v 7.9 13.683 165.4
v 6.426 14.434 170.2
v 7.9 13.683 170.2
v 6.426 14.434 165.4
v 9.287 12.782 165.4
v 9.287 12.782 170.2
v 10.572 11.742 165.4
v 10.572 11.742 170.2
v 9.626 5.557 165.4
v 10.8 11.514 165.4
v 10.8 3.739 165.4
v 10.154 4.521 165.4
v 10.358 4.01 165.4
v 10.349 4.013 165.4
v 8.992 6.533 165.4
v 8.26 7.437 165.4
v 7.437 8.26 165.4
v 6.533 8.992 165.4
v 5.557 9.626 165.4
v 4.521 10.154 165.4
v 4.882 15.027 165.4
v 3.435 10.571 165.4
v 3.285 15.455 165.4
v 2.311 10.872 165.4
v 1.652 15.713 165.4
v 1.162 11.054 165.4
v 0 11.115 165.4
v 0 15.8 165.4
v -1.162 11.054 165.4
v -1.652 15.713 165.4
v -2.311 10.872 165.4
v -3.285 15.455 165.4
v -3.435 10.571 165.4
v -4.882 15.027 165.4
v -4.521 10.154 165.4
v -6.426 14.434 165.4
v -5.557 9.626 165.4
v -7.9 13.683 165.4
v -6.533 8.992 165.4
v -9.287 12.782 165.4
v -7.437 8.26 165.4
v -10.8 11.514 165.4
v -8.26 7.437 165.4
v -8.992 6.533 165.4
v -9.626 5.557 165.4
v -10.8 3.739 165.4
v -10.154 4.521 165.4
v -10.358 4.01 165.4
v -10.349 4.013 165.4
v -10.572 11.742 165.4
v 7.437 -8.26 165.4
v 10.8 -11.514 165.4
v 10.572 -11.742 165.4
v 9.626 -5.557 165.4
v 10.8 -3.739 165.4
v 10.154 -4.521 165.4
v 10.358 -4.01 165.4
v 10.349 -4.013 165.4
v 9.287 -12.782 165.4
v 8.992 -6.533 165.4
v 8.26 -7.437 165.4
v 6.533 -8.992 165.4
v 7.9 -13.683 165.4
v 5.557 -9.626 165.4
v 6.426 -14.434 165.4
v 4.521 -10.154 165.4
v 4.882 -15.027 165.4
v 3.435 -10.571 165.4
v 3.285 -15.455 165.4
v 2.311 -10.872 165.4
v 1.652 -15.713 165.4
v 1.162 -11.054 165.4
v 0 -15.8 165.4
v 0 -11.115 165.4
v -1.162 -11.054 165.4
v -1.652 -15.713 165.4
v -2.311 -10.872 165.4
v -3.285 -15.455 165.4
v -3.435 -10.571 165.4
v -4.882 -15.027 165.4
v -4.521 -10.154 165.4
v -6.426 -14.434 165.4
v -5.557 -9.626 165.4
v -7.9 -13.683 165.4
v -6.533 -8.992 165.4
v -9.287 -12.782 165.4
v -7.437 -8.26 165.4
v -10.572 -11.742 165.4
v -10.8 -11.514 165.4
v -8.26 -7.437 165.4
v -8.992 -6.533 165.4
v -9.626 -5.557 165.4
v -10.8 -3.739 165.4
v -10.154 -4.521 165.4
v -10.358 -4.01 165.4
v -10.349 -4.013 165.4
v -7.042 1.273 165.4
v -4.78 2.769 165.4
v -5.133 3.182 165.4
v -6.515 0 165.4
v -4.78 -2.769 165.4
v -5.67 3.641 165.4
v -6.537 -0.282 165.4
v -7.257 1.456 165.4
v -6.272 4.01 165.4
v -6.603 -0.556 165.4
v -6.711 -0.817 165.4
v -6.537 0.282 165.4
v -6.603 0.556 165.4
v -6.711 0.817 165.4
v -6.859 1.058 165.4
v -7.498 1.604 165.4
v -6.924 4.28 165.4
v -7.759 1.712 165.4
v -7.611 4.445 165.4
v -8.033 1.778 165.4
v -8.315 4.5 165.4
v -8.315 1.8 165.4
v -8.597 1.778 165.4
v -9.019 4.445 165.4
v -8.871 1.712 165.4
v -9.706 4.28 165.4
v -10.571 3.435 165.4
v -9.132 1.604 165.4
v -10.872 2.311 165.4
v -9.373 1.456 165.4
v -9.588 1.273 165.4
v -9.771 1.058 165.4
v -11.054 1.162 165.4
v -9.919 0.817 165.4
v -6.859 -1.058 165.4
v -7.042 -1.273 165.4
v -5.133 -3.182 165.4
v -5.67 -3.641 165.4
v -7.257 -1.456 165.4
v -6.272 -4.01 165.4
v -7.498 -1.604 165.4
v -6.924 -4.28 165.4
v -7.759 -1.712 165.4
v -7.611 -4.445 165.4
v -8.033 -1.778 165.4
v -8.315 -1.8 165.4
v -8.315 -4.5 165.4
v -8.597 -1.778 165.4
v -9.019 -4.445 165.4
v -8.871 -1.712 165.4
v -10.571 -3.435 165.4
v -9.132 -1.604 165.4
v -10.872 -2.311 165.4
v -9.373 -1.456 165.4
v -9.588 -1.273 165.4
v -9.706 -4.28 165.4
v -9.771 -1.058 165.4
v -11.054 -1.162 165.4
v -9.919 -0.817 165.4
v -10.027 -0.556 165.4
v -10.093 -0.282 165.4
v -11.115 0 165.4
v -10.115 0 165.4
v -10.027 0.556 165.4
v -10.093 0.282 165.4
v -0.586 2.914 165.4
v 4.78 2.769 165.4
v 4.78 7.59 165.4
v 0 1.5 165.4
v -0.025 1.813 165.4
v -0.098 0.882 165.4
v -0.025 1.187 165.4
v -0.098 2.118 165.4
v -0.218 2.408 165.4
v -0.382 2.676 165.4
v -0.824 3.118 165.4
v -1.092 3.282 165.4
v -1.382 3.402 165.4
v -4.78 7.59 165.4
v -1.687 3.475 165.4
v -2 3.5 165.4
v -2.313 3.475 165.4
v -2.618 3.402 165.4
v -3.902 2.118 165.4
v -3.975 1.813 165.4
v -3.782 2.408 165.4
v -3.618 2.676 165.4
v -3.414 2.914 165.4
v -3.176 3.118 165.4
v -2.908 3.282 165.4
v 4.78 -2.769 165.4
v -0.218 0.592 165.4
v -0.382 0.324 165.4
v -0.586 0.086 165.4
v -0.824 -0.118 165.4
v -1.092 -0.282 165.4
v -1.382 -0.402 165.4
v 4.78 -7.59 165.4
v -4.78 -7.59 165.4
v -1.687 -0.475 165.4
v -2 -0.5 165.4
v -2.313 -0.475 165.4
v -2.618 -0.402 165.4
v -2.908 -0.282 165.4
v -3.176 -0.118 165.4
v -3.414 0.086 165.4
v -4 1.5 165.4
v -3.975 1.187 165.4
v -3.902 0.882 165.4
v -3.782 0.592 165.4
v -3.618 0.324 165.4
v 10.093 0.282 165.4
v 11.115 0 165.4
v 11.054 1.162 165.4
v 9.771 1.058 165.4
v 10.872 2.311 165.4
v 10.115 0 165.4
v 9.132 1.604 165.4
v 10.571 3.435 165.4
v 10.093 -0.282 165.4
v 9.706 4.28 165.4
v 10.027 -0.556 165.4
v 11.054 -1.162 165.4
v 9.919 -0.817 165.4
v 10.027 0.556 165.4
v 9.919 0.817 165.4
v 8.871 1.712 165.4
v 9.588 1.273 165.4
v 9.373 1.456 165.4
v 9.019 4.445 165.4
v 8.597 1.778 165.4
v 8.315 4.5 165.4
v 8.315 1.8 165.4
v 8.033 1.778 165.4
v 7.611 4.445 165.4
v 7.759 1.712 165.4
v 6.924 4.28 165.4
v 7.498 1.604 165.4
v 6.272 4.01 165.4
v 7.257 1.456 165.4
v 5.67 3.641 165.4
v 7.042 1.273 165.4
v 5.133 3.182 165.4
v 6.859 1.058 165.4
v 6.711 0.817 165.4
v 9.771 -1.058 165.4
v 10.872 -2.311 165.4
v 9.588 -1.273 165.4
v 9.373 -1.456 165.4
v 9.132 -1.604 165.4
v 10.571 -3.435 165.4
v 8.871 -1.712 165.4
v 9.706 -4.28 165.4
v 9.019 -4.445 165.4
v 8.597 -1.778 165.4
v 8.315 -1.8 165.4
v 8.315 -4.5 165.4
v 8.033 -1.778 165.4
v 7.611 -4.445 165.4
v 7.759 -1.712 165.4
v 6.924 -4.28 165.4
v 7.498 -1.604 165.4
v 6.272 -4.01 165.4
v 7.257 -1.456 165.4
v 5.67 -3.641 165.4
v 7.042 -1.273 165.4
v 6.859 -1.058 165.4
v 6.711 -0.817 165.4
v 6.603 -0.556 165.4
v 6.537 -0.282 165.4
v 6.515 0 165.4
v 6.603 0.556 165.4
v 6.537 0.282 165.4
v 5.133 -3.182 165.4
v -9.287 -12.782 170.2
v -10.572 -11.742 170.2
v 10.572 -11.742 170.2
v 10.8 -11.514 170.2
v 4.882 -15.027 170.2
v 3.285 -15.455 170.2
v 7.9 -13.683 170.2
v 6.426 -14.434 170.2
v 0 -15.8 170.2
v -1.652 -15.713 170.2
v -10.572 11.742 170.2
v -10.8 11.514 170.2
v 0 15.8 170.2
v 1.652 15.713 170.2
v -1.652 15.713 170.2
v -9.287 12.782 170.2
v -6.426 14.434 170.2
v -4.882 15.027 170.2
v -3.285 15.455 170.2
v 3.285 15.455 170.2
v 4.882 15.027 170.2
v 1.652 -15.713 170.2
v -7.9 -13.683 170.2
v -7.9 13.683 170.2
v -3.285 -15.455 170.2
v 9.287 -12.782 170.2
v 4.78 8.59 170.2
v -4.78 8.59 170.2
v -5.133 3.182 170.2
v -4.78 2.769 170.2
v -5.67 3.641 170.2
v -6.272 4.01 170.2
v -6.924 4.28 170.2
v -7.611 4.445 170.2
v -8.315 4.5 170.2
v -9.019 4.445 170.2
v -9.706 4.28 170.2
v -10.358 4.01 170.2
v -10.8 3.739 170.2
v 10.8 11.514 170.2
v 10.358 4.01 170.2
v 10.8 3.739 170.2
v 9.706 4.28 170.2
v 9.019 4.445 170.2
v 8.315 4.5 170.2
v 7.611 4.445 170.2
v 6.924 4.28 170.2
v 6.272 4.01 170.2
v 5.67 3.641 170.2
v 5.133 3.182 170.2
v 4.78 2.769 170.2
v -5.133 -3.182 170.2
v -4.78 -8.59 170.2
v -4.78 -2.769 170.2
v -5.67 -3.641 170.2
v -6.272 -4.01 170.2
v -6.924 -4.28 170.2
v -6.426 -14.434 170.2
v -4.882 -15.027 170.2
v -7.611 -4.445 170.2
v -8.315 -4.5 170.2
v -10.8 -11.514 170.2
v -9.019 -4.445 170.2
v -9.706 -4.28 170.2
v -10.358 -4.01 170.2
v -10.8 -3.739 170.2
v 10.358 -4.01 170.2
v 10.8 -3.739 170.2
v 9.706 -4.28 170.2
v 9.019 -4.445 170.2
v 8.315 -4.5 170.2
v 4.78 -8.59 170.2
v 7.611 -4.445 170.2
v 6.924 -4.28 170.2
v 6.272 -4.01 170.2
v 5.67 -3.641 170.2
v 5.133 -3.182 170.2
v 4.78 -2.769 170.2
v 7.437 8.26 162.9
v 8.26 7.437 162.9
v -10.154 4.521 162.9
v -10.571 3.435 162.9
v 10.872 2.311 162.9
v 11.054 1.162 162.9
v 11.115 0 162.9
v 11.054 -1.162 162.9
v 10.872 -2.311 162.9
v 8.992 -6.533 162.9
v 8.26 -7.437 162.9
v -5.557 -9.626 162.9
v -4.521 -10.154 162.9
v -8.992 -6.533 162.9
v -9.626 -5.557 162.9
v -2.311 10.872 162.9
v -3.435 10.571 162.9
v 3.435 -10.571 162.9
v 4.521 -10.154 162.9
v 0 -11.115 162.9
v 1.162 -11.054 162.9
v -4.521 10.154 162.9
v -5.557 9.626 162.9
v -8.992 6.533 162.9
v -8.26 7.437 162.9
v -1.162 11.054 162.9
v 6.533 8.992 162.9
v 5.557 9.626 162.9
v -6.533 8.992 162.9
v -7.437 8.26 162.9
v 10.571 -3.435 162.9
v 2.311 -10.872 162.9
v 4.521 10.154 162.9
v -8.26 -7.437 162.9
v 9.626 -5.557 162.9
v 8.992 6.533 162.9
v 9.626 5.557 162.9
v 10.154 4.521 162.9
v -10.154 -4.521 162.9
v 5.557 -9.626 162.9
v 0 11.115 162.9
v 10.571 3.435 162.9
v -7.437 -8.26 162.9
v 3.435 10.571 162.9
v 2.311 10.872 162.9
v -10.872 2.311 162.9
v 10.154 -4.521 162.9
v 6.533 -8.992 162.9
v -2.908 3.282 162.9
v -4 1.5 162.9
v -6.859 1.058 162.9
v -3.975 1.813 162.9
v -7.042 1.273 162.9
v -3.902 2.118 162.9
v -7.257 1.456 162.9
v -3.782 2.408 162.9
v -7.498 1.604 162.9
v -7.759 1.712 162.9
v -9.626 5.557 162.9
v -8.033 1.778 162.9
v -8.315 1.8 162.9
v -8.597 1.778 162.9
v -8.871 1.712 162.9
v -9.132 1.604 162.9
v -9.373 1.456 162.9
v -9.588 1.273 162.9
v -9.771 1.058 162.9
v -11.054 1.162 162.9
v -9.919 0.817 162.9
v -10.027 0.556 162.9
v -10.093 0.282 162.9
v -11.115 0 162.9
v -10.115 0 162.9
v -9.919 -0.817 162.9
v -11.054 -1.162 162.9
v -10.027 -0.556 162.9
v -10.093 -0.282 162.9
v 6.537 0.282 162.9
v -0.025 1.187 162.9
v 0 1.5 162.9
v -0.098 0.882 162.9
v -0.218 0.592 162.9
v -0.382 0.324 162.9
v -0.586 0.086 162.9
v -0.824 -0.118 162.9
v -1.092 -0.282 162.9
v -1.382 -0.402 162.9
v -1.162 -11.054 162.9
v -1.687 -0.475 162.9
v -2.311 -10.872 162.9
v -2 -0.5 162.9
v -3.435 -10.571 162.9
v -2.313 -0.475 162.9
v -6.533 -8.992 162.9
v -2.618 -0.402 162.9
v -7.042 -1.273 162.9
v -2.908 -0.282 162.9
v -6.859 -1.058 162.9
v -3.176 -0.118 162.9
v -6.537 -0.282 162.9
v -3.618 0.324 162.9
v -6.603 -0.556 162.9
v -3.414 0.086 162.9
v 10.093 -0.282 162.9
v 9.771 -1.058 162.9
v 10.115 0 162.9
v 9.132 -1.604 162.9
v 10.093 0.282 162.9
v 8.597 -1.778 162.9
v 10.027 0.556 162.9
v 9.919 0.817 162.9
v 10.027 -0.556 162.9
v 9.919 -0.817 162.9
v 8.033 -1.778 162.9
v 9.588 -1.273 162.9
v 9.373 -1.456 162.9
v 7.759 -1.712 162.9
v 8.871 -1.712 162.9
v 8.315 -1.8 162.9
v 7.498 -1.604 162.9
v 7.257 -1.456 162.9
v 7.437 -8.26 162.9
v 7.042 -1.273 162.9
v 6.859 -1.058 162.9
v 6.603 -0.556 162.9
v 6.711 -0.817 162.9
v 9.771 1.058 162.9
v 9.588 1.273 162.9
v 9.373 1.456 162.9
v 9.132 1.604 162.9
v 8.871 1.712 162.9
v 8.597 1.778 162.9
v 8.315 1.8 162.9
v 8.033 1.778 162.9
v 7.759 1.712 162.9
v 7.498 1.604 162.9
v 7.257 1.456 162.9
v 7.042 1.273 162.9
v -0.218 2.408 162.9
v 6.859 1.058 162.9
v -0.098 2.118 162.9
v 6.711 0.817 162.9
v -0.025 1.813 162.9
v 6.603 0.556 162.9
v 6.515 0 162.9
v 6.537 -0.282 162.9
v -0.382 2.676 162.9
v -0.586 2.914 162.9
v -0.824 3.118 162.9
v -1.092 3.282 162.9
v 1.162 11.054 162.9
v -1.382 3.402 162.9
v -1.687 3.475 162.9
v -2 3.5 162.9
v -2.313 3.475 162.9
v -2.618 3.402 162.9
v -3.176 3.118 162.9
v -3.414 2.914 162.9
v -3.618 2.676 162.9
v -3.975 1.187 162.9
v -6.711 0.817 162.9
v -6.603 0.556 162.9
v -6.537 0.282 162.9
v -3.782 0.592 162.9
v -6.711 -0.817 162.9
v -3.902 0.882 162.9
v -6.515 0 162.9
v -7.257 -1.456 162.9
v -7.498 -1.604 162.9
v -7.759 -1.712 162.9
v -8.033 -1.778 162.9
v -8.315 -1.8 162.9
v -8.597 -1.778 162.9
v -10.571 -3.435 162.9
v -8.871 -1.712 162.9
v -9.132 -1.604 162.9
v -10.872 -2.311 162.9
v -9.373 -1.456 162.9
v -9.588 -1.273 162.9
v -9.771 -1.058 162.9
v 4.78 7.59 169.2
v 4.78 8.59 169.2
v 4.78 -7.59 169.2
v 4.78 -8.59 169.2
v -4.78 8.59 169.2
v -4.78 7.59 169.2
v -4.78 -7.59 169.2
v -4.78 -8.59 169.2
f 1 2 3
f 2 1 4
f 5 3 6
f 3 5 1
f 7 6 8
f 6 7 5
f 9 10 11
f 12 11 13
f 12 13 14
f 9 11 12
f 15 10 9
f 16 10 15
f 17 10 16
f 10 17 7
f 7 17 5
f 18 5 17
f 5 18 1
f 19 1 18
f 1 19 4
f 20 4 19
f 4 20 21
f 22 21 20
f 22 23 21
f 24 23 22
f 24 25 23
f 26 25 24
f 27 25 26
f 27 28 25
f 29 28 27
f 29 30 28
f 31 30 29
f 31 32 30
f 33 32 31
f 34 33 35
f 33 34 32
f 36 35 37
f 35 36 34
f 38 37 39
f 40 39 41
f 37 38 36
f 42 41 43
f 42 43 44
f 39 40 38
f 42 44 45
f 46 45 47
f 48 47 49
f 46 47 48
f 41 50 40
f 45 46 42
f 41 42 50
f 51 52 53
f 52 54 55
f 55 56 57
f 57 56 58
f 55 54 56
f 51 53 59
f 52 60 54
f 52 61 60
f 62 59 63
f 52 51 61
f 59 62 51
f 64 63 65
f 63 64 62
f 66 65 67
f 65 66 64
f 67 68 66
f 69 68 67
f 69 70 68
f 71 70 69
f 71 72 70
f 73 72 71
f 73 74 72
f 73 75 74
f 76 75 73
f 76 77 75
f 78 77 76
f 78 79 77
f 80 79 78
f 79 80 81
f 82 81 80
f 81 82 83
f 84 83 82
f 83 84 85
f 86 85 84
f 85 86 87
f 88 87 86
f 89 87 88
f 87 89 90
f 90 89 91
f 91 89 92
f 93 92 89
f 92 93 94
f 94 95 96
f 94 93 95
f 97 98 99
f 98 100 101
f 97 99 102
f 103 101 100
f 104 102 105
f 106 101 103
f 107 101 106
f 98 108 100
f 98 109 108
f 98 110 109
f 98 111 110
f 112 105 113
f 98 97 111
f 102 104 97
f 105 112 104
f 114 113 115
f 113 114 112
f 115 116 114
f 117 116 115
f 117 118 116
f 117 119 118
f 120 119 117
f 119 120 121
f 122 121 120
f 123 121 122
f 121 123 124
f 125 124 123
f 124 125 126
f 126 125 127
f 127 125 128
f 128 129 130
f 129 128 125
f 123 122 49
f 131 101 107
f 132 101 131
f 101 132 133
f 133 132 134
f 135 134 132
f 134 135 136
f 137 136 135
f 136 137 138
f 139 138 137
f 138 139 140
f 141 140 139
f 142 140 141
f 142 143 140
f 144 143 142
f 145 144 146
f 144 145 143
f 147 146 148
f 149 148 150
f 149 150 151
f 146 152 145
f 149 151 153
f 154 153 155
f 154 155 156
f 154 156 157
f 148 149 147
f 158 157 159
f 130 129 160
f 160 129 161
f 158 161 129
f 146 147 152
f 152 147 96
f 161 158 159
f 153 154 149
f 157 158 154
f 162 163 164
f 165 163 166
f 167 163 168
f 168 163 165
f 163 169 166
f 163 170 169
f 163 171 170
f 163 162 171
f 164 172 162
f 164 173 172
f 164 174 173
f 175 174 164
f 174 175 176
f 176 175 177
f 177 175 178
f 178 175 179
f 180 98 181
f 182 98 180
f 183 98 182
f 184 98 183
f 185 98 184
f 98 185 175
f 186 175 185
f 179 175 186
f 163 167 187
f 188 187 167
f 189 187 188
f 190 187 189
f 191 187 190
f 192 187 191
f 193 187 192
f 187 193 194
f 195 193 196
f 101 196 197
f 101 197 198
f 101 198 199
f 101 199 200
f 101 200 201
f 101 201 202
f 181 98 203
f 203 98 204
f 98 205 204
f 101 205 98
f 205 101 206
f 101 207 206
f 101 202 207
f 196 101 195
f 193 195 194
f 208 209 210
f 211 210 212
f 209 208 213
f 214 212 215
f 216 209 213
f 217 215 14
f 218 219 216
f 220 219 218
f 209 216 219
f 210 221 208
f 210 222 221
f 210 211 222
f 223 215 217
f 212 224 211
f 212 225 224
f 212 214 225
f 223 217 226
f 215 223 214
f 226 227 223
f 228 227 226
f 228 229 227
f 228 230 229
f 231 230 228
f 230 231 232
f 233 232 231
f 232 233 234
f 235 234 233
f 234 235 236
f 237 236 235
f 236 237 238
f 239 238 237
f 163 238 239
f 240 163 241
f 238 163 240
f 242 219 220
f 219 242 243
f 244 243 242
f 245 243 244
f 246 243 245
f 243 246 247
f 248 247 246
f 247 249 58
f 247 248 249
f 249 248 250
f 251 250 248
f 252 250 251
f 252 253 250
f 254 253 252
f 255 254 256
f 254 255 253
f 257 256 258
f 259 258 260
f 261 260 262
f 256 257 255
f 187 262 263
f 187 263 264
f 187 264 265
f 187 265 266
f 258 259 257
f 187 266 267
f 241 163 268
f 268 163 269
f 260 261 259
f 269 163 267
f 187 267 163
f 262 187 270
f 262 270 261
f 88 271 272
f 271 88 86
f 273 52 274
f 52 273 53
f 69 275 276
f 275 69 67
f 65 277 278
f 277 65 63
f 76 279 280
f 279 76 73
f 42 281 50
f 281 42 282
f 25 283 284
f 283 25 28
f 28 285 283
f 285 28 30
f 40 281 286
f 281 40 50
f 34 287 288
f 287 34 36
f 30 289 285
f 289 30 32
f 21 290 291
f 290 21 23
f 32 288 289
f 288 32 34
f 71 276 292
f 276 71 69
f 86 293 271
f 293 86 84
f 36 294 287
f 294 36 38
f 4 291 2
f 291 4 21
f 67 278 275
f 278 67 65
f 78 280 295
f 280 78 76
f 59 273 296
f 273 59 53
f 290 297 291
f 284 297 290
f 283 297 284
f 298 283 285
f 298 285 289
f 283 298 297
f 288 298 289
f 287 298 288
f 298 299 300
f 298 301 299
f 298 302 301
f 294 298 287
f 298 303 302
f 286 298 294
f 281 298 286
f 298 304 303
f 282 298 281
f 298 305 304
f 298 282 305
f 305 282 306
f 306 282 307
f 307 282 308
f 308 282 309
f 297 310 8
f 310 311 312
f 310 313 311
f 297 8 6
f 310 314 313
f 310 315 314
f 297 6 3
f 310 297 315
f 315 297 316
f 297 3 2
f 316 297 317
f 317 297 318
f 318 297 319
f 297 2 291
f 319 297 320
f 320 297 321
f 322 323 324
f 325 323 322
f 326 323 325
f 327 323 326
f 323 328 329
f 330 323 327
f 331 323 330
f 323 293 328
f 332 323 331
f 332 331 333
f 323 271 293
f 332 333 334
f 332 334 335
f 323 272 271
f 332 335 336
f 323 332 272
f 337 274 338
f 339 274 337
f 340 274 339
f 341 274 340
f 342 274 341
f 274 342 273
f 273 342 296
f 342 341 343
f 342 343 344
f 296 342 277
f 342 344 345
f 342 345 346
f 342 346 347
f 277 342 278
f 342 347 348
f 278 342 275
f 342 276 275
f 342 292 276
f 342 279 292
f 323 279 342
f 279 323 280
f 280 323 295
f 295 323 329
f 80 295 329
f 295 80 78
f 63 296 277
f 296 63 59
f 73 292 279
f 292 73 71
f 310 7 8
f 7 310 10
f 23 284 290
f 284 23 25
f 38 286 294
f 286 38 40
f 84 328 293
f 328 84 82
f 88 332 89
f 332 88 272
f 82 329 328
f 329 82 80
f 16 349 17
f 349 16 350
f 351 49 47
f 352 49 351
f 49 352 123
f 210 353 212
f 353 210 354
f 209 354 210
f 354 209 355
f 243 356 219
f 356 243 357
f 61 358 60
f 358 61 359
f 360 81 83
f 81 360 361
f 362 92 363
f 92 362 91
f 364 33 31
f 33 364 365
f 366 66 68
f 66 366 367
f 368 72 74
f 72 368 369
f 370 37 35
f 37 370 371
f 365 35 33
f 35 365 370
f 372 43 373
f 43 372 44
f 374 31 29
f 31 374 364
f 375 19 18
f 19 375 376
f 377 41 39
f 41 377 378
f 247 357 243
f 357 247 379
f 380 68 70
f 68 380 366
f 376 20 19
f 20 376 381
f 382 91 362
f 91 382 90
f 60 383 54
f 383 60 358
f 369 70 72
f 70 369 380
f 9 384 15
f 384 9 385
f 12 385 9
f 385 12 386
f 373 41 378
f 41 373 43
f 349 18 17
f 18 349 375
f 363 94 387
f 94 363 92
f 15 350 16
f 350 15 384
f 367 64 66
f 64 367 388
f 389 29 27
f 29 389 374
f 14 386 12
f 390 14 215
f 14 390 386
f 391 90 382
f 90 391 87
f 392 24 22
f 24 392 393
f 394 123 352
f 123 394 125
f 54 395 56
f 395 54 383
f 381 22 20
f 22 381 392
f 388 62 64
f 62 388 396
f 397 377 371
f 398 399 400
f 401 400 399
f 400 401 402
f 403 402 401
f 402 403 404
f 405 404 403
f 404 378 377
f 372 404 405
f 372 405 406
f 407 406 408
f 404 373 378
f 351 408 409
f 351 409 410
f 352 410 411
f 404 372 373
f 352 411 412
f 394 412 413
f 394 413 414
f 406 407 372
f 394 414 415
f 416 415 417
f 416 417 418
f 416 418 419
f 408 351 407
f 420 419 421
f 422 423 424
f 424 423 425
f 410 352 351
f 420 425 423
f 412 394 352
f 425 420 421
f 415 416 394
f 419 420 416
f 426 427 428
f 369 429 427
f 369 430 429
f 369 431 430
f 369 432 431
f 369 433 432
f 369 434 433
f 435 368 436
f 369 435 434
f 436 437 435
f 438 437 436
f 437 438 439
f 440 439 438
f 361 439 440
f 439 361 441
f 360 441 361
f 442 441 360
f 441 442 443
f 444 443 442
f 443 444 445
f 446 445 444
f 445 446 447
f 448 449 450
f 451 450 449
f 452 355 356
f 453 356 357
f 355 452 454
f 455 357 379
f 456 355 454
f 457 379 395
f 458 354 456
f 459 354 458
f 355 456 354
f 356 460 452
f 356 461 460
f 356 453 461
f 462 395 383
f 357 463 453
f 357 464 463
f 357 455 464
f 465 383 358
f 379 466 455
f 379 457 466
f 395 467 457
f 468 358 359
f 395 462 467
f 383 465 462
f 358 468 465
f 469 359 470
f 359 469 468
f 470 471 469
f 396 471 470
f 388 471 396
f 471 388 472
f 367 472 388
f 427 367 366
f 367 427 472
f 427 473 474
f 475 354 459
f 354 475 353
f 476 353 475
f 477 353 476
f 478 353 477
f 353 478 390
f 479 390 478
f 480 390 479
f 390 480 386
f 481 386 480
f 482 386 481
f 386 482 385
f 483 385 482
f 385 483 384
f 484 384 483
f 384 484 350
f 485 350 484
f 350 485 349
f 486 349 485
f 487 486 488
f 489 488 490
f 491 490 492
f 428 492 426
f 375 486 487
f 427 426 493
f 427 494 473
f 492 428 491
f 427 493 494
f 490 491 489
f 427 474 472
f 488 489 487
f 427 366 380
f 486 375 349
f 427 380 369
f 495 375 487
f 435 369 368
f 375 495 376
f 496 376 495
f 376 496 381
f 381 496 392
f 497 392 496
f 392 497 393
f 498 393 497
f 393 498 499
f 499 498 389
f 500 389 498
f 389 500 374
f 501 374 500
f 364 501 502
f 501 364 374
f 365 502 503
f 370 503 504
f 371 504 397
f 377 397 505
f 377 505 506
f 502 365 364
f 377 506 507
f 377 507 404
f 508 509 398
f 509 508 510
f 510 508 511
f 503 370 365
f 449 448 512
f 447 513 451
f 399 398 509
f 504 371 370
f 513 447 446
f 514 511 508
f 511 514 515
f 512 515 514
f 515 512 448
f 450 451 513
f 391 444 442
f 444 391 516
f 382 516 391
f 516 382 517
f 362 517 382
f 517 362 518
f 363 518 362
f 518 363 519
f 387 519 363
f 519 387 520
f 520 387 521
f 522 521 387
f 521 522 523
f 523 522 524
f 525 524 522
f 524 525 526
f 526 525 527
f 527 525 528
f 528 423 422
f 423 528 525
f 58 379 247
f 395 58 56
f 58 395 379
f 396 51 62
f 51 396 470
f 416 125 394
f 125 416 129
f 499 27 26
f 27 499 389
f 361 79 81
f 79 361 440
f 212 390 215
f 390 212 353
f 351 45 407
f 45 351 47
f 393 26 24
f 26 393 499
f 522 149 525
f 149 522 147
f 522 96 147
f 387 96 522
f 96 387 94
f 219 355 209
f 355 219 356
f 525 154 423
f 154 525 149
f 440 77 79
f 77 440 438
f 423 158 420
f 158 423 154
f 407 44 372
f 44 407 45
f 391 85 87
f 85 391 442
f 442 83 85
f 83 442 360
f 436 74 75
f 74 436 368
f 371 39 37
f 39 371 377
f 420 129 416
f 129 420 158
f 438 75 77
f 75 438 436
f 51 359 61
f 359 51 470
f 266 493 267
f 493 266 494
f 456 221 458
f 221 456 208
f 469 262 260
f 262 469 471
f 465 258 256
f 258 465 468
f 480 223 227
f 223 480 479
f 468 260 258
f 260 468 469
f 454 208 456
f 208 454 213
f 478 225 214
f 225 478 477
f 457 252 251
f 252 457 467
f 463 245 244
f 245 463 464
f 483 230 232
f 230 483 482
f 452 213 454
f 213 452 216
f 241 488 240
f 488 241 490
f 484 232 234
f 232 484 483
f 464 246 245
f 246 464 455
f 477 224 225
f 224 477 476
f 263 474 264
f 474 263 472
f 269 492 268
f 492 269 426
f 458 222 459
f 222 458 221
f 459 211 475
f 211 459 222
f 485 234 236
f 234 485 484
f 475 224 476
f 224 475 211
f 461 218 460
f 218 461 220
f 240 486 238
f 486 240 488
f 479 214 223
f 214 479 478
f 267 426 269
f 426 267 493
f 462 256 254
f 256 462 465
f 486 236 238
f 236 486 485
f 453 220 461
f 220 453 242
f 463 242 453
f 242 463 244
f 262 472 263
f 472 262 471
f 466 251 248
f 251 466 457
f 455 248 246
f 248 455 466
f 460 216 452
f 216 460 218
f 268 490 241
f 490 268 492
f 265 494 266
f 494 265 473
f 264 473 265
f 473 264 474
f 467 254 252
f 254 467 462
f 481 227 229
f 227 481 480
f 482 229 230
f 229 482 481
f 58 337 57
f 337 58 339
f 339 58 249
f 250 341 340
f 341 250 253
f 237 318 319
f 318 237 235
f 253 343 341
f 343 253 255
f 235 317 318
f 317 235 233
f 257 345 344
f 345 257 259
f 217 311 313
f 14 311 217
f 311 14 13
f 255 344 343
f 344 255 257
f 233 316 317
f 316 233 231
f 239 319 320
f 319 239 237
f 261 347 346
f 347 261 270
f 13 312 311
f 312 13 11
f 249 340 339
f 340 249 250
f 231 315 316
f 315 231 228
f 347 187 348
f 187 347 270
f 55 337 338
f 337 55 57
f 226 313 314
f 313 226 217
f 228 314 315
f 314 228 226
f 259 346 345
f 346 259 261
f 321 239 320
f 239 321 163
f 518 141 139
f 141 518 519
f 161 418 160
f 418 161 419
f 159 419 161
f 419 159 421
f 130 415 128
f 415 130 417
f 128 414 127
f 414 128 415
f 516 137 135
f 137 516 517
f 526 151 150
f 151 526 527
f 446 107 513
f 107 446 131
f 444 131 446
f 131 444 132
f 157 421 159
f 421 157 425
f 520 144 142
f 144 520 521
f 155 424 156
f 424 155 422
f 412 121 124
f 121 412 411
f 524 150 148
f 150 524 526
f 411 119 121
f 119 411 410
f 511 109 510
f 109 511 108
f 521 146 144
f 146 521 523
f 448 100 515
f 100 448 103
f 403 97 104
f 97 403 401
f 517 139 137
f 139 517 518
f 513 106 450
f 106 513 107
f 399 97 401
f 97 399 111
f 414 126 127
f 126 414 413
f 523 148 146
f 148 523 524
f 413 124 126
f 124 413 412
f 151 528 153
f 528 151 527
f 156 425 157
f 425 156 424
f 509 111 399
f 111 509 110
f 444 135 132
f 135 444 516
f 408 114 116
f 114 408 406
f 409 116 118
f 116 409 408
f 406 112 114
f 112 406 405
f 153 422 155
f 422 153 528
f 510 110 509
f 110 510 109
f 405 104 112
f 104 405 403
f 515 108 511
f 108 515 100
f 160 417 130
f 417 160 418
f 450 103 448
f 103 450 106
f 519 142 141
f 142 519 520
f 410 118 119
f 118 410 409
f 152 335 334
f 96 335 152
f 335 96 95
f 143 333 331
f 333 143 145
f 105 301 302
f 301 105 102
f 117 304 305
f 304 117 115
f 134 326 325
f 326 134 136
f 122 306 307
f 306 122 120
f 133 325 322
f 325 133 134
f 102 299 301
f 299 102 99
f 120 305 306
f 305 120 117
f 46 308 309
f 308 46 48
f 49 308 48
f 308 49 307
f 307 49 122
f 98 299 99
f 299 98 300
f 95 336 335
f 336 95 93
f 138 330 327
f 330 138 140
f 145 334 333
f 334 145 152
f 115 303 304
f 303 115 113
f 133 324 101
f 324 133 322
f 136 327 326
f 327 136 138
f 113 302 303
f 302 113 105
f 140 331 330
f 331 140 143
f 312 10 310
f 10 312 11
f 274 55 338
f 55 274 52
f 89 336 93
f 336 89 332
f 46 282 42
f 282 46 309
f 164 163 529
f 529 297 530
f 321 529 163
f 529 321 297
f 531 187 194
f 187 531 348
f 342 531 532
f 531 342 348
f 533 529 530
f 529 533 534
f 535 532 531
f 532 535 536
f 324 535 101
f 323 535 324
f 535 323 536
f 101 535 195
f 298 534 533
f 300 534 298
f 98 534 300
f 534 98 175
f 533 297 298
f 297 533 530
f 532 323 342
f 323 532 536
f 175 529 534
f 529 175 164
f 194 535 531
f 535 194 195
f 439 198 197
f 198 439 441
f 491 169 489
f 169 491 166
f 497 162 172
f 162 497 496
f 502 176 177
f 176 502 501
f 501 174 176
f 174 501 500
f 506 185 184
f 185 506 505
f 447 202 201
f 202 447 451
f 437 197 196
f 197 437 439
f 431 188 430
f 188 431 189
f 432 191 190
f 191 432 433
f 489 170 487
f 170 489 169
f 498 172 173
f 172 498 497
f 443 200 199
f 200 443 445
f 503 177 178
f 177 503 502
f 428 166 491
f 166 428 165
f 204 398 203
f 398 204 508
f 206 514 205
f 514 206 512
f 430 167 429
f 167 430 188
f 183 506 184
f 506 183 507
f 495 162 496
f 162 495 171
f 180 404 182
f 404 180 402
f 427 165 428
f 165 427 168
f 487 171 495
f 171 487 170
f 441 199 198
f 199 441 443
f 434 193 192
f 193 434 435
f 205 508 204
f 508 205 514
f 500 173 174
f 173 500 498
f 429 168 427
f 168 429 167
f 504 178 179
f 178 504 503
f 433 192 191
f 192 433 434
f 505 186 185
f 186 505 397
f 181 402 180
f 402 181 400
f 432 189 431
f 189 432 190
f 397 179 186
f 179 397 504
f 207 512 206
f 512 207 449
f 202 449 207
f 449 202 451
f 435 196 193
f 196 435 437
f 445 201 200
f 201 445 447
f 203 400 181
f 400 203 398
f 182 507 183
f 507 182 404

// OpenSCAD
// file: ../baffles.scad
use <shapes.scad>

D_OUTER = 2;
D_THIN  = 3;
D_INNER = 6;

module curveBridge(h, y, z, low, high)
{
    EPS = 0.1;

    // a + b*t + c*t*t + d*t*t*t
    al = low[0];
    bl = low[1];
    cl = low[2];
    dl = low[3];
    ah = high[0];
    bh = high[1];
    ch = high[2];
    dh = high[3];

    t = z;
    points = [
        [-EPS, al],
        [0.1, al + 0.1*bl + 0.1*0.1*cl + 0.1*0.1*0.1*dl],
        [0.2, al + 0.2*bl + 0.2*0.2*cl + 0.2*0.2*0.2*dl],
        [0.3, al + 0.3*bl + 0.3*0.3*cl + 0.3*0.3*0.3*dl],
        [0.4, al + 0.4*bl + 0.4*0.4*cl + 0.4*0.4*0.4*dl],
        [0.5, al + 0.5*bl + 0.5*0.5*cl + 0.5*0.5*0.5*dl],
        [0.6, al + 0.6*bl + 0.6*0.6*cl + 0.6*0.6*0.6*dl],
        [0.7, al + 0.7*bl + 0.7*0.7*cl + 0.7*0.7*0.7*dl],
        [0.8, al + 0.8*bl + 0.8*0.8*cl + 0.8*0.8*0.8*dl],
        [0.9, al + 0.9*bl + 0.9*0.9*cl + 0.9*0.9*0.9*dl],
        [1.0+EPS, al + 1.0*bl + 1.0*1.0*cl + 1.0*1.0*1.0*dl],
        [1.0+EPS, ah + 1.0*bh + 1.0*1.0*ch + 1.0*1.0*1.0*dh],
        [0.9, ah + 0.9*bh + 0.9*0.9*ch + 0.9*0.9*0.9*dh],
        [0.8, ah + 0.8*bh + 0.8*0.8*ch + 0.8*0.8*0.8*dh],
        [0.7, ah + 0.7*bh + 0.7*0.7*ch + 0.7*0.7*0.7*dh],
        [0.6, ah + 0.6*bh + 0.6*0.6*ch + 0.6*0.6*0.6*dh],
        [0.5, ah + 0.5*bh + 0.5*0.5*ch + 0.5*0.5*0.5*dh],
        [0.4, ah + 0.4*bh + 0.4*0.4*ch + 0.4*0.4*0.4*dh],
        [0.3, ah + 0.3*bh + 0.3*0.3*ch + 0.3*0.3*0.3*dh],
        [0.2, ah + 0.2*bh + 0.2*0.2*ch + 0.2*0.2*0.2*dh],
        [0.1, ah + 0.1*bh + 0.1*0.1*ch + 0.1*0.1*0.1*dh],
        [-EPS, ah]
    ];

    multmatrix(m = [ [0, 0, 1, 0],
                     [0, y, 0, 0],
                     [z, 0, 0, 0],
                     [0, 0, 0, 1]
                ])
    linear_extrude(height = h) {
        polygon(points=points);
    }  	
}

module bridge2(d, dz)
{
    difference() {
        intersection() 
        {
            tube(h=dz, do=d - D_OUTER, di=d - D_INNER);
            union() {
                translate([-d, d*0.10, 0]) {
                    polygonYZ(d*2, [
                        [0,0], [dz*2, dz*2], [dz*4, dz*1.5], [dz*2, 0]
                    ]);
                }        
                translate([-d, -d*0.32, 0]) {
                    polygonYZ(d*2, [[0,0], [dz*2, dz*2], [dz*2, 0]]);
                }        
            }
        }
        BATTERY = 19.0; // padded
        translate([0, d/2 - BATTERY/2, 0])
            cylinder(h=d, d=BATTERY);
    }
}

module bridge3(d, dz)
{
    difference() {
        union() {
            intersection() 
            {
                tube(h=dz, do=d - D_OUTER, di=d - D_INNER);
                union() {
                    translate([-d, 0, 0]) {
                        curveBridge(d*2, dz, dz, 
                            [-2.5, 1.0, 1.0, 0.0], 
                            [-1.5, 0.5, 2.0, 0.0]);
                    }
                    translate([-d, 0, 0]) {
                        curveBridge(d*2, dz, dz, 
                            [ 0.0, 1.0, 1.0, 0.0], 
                            [ 1.5, 0.0, 1.5, 0.0]);
                    }
                }
            }
            color("silver") 
            intersection() 
            {
                tube(h=dz, do=d - D_THIN, di=d - D_INNER);
                translate([-d, 0, 0]) {
                    curveBridge(d*2, dz, dz, 
                        [ 2.5, -1.0, -1.5, 0.0], 
                        [ 3.0, -1.0, 0.5, 0.0]);
                }
            }
            color("silver")
            intersection() 
            {
                tube(h=dz, do=d - D_THIN, di=d - D_INNER);
                translate([-d, 0, 0]) {
                    curveBridge(d*2, dz, dz, 
                        [ -0.8, -1.0, -0.5, -0.2], 
                        [ -0.2, -1.0, -0.1, 0.0]);
                }
            }
        }
        BATTERY = 19.0; // padded
        translate([0, d/2 - BATTERY/2, 0])
            cylinder(h=d, d=BATTERY);
        X = 19.0; // padded
        translate([-X/2, -d/2, 0])
            cube(size=[X, d/2, dz]);
    }
}

$fn = 80;

translate([0, 0, 0]) tube(h=4, do=32, di=26);
translate([0, 0, 8]) tube(h=4, do=32, di=26);
translate([0, 0, 16]) tube(h=4, do=32, di=26);
translate([0, 0, 24]) tube(h=4, do=32, di=26);
translate([0, 0, 32]) tube(h=4, do=32, di=26);

translate([0, 0, 4]) bridge3(32, 4);
translate([0, 0, 12]) bridge3(32, 4);
translate([0, 0, 20]) bridge3(32, 4);
translate([0, 0, 28]) bridge3(32, 4);


/*
translate([0, 0, 0]) cube(size=[1, 30, 4]);
translate([0, 0, 8]) cube(size=[1, 30, 4]);
translate([-1, 4, 4]) 
    curveBridge(0.8, 4, 4, [0, 1.0, 0.3, 0.1], 
                           [1, 1.0, 0.3, 0.1]);
translate([-1, 16, 4]) 
    curveBridge(0.8, 4, 4, [0, 1.0, 0.3, 0.1], 
                           [1, 1.0, 0.3, 0.1]);                           

translate([0, 16, 4]) 
    curveBridge(0.8, 4, 4, [0, -1.0, 0.3, 0.1], 
                           [0.6, -1.0, 0.3, 0.1]);
*/
// file: case.scad
use <../shapes.scad>
include <dim.scad>

module dotstar() {
    for(i=[0:3]) {
        translate([0, 0, 7.0*i]) rotate([0, -90, 0]) cylinder(h=100, d=2.0);
    }
}

module brassSleeve(addOuter=0)
{
    color("Gold") 
    difference() {
        union() {
            translate([0, 0, M_BRASS])
                tube(h=DZ_BRASS, do=DO_BRASS + addOuter, di=DI_BRASS, $fn=60);
        }
        //rotate([0, 0, 180]) brassCenterCut();
        //echo("First dotstart, from top of BRASS", M_FIRST_DOTSTAR - (M_BRASS + DZ_BRASS));
        //translate([0, 0, M_FIRST_DOTSTAR]) dotstar();

        translate([0, 0, M_ALIGN]) rotate([90, 0, 0]) cylinder(h=100, d=4.2);

        TCUTBRASS = 19.0;
        //echo("Brass switch cutout center d=", TCUTBRASS, "m=", M_SWITCH - M_ALIGN);
        hull() {
            translate([0, 0, M_SWITCH]) rotate([-90, 0, 0]) cylinder(h=100, d=TCUTBRASS);
            translate([0, 0, 0]) rotate([-90, 0, 0]) cylinder(h=100, d=TCUTBRASS);
        }
    }
}

module copperChamber()
{
    color("DarkGoldenrod") 
    difference() {
        union() {
            translate([0, 0, M_COPPER])
                tube(h=DZ_COPPER, do=DO_COPPER, di=DI_COPPER, $fn=80);
        }

        /*
        W = 8.0;
        END_Z = 4.0;
        translate([-W/2, -50, M_COPPER + END_Z])
            cube(size=[W, 100, DZ_COPPER - END_Z*2]);
        */
        
        BIT = 3.175;
        BASE = 12.0 + BIT / 2;
        DZ_GEM = M_DESIGN_MAX - (M_DESIGN_MIN + BASE) - BIT/2;

        echo("Copper center z=", M_DESIGN_MIN + BASE +  DZ_GEM/2 - M_COPPER);

        translate([0, -50, M_DESIGN_MIN + BASE +  DZ_GEM/2])
            scale([1, 1, 2.2])
                rotate([-90, 0, 0])
                    cylinder(h=100, d=11.0);
    }
}
// file: ../shapes.scad
FACES   = 180;
EPSILON = 0.1;
PIN	    = 2.54;


module tube(h=1, inner=0, outer=0, di=0, do=0) {
    rInner = inner > 0 ? inner : di / 2;
    rOuter = outer > 0 ? outer : do / 2;

	if (rInner >= rOuter) echo("ERROR in tube. rOuter must be > rInner.");

	difference() {
		cylinder(h=h, r=rOuter);
		translate([0,0,-EPSILON]) {
			cylinder(h=h + EPSILON*2, r=rInner);
		}
	}
}

module roundedRect(size, r, up="z")
{
	if (up == "x") {
		H = size[0];
		hull()
		{
			translate([0, r, r]) rotate([0, 90, 0]) cylinder(r=r, h=H);
			translate([0, size[1] - r, r]) rotate([0, 90, 0]) cylinder(r=r, h=H);
			translate([0, r, size[2] - r]) rotate([0, 90, 0]) cylinder(r=r, h=H);
			translate([0, size[1] - r, size[2] - r]) rotate([0, 90, 0]) cylinder(r=r, h=H);
		}
	}
	else if (up == "y") {
		H = size[1];
		hull()
		{
			translate([r, 0, r]) rotate([-90, 0, 0]) cylinder(r=r, h=H);
			translate([size[0] - r, 0, r]) rotate([-90, 0, 0]) cylinder(r=r, h=H);
			translate([r, 0, size[2] - r]) rotate([-90, 0, 0]) cylinder(r=r, h=H);
			translate([size[0] - r, 0, size[2] - r]) rotate([-90, 0, 0]) cylinder(r=r, h=H);
		}
	}
	else {
		H = size[2];
		hull()
		{
			translate([r, r, 0])  cylinder(r=r, h=H);
			translate([size[0] - r, r, 0])  cylinder(r=r, h=H);
			translate([r, size[1] - r, 0])  cylinder(r=r, h=H);
			translate([size[0] - r, size[1] - r, 0])  cylinder(r=r, h=H);
		}
	}
}

module cubePair(x, size)
{
	translate([x, 0, 0])
		cube(size=size);
	mirror([1,0,0]) translate([x, 0, 0])
		cube(size=size);
}

module polygonXY(h, points)
{
    linear_extrude(height = h) {
        polygon(points=points);
    }  
}

module polygonYZ(h, points)
{
    multmatrix(m = [ [0, 0, 1, 0],
    				 [1, 0, 0, 0],
    				 [0, 1, 0, 0],
    				 [0, 0, 0, 1]
       			   ])
    linear_extrude(height = h) {
        polygon(points=points);
    }  	
}

module polygonXZ(h, points)
{
    multmatrix(m = [ [1, 0, 0, 0],
    				 [0, 0, 1, 0],
    				 [0, 1, 0, 0],
    				 [0, 0, 0, 1]
       			   ])
    linear_extrude(height = h) {
        polygon(points=points);
    }  	
}


module zCapsule(dz0, dz1, r, roundedRect=0)
{
	if (roundedRect == 0) {
		hull() {
			translate([0, 0, dz0]) rotate([-90, 0, 0]) cylinder(h=50, r=r);
			translate([0, 0, dz1]) rotate([-90, 0, 0]) cylinder(h=50, r=r);
		}
	}
	else {
		if (dz1 < dz0) {
			t = dz0;
			dz0 = dz1;
			dz1 = t;
		}
		hull() {
			translate([r - roundedRect, 0, dz0 - r + roundedRect]) 
				rotate([-90, 0, 0]) cylinder(h=50, r=roundedRect);
			translate([-r + roundedRect, 0, dz0 - r + roundedRect]) 
				rotate([-90, 0, 0]) cylinder(h=50, r=roundedRect);
			translate([r - roundedRect, 0, dz1 + r - roundedRect]) 
				rotate([-90, 0, 0]) cylinder(h=50, r=roundedRect);
			translate([-r + roundedRect, 0, dz1 + r - roundedRect]) 
				rotate([-90, 0, 0]) cylinder(h=50, r=roundedRect);
		}
	}
}


module xRoofCube(size)
{
	x = size[0];
	y = size[1];
	z = size[2];

	polygonXY(h=z, points=[
		[0, 0],
		[x, 0],
		[x, y + x],		// gets the 45 degree angle for printing
		[0, y]
	]);
}
// file: dim.scad
M_POMMEL = -26.0;
DZ_SPKR = 12.0;
M_MC_BATTERY = M_POMMEL + DZ_SPKR;
M_0 = 0;
M_BODY_END = 7 * 25.4;
M_EXT_END = M_BODY_END + 18.80;

M_SWITCH = 104.4;
M_PORT = M_SWITCH - 16.0;
M_ALIGN = M_SWITCH;
D_CAPSULE = 12.0;

N_BATT_BAFFLES = 10;
DZ_BAFFLE = 3.7;
M_JOINT = M_MC_BATTERY + (N_BATT_BAFFLES * 2 - 1)*DZ_BAFFLE;

// M_FIRST_DOTSTAR = 137.0;    // front
//M_FIRST_DOTSTAR = 86.2;
M_FIRST_DOTSTAR = M_ALIGN - 7 * 2.5;    // back one dotstar

M_PCB_COUPLER = M_EXT_END 
    - 28.9  // to base of thread
    + 12.9  // to emitter pcb
    - 12.4; // header + coupler pcb

M_DESIGN_MIN = M_BODY_END - 58.6;   // no physical limit except the rings
M_DESIGN_MAX_THREAD = M_BODY_END - 15.66;  // threads
M_DESIGN_MAX_COUPLER = M_PCB_COUPLER;
M_DESIGN_MAX = M_DESIGN_MAX_THREAD;

D_INNER = 31.60;
D_RING = 32.0;  // fixme
D_OUTER = 36.9;

OUTER_RING_START = 17.70;
OUTER_RING_SPACE = 14.19;
OUTER_RING_WIDTH = 1.9;
OUTER_RING_DEPTH = 0.65;
N_OUTER_RING = 8;

DO_COPPER = 24.2;
DI_COPPER = 22.23;
DZ_COPPER = 42.20;
M_COPPER = M_DESIGN_MIN + 4.0;

DO_BRASS = D_INNER;
DI_BRASS = 28.96;
M_BRASS = 80.0;
DZ_BRASS = (M_COPPER + DZ_COPPER) - M_BRASS; // trying to avoid cutting the copper // DZ_COPPER + 4.0;
// main file
include <dim.scad>
use <../commonUnified.scad>
use <../shapes.scad>
use <case.scad>

DRAW_AFT = false;
DRAW_FORE = false;
DRAW_COUPLER = true;

T_JOINT = 3.5;
DZ_JOINT = 8;
T = 6.5;
EPS = 0.01;

NUT_W = 8.6;
NUT_Y = 3.4;
SMALL_NUT_W = 8.0;
SMALL_NUT_Y = 2.8;
SMALL_NUT_D = 9.0;

D_ROD = 3.6;   // Travel free - secured by nuts
D_ROD_HEAD = 6.6;

NUT_FLOOR = -D_INNER/2 + 3.0;
COPPER_OUTSET = 0.1;

H_HOLDER_0 = 3.0;
H_HOLDER_1 = 2.0;

$fn = 40;

if (DRAW_AFT) {
    translate([0, 0, M_POMMEL]) {
        speakerHolder(D_INNER, DZ_SPKR, 3.0, "std28");
    }

    translate([0, 0, M_MC_BATTERY]) {
        baffleMCBattery(D_INNER, N_BATT_BAFFLES, DZ_BAFFLE, bridgeStyle=2);
        *color("red") battery(D_INNER, "18650");
    }

    translate([0, 0, M_JOINT]) rotate([0, 0, 0])
        keyJoint(DZ_JOINT, D_INNER, D_INNER - T_JOINT, false);

}

module bolt()
{
    M_BOLT = M_COPPER - H_HOLDER_0;
    M_HEAD = M_BOLT - 20.0;
    M_NUT = M_COPPER + DZ_COPPER;
    // Subtract 1 for access for wire
    RAD = DI_COPPER/2 - D_ROD/2 - 1.0;

    // Back access.
    translate([RAD, 0, M_HEAD]) cylinder(h=M_BOLT - M_HEAD, d=D_ROD_HEAD);
    // Bolt
    translate([RAD, 0, M_BOLT]) cylinder(h=M_NUT - M_BOLT, d=D_ROD);
    // Nut & access
    translate([RAD, 0, M_NUT]) cylinder(h=100, d=SMALL_NUT_D);
}

module bolts()
{
    bolt();
    mirror([-1, 0, 0]) bolt();
}


module dotstarCutout()
{
    dotstarZ = 30.0;
    dotstarX = 12.4;    // of the strip, not the LED
    CENTER = M_ALIGN - 7.0;

    SETBACK = 3.3;
    translate([0, 0, CENTER - dotstarZ/2]) mirror([-1, 0, 0]) {            
        translate([D_INNER/2 - SETBACK, 0, 0]) 
            polygonXY(h=dotstarZ, points = [
                [0, -dotstarX/2],
                [10, -dotstarX/2 + 10],
                [10, dotstarX/2 + 10],
                [0, dotstarX/2]
            ]);
        
        // Wire access    
        DY_WIRE = 9.0;
        DZ_WIRE = 4.0;
        translate([0, -DY_WIRE/2, -DZ_WIRE/2]) cube(size=[100, DY_WIRE, DZ_WIRE]);
        translate([0, -DY_WIRE/2, dotstarZ - DZ_WIRE/2]) cube(size=[100, DY_WIRE, DZ_WIRE]);
    }
}

module flatBottom()
{
    translate([-50, -D_INNER/2 - EPS, 0]) cube(size=[100, 2.0, 200]);
}

module frontNotch()
{
    // Do something about all that plastic in the front...
    //translate([-50, 6.0, M_SWITCH + 10.0]) cube(size=[100, 100, 100]);
    D = 2.0 * (D_INNER/2 - 6.0);

    hull() {
        translate([50, 6.0 + D/2, M_SWITCH + 18.0])
            rotate([0, -90, 0])
                cylinder(h=100, d=D);
        translate([50, 6.0 + D/2, M_SWITCH + 40])
            rotate([0, -90, 0])
                cylinder(h=100, d=D);
    }
}

if (DRAW_FORE) 
{
    DZ_POWER_RING = M_PORT - M_JOINT + 8.0;
    M_SWITCH_SECTION = M_JOINT + DZ_POWER_RING;
    DZ_SWITCH_SECTION = (M_COPPER - H_HOLDER_0) - M_SWITCH_SECTION;

    difference() {
        union() {

            // Power
            difference() {
                translate([0, 0, M_JOINT]) {
                    powerPortRing(D_INNER, T, DZ_POWER_RING, M_PORT - M_JOINT);
                }
                translate([0, 0, M_JOINT]) rotate([0, 0, 0])
                    keyJoint(DZ_JOINT, D_INNER, D_INNER - T_JOINT, true);
            }

            // Switch
            translate([0, 0, M_SWITCH_SECTION]) 
                switchRing(D_INNER, T, DZ_SWITCH_SECTION, 
                    M_SWITCH - M_SWITCH_SECTION, counter=false);

            // Bottom holder for the locking nut (punch out below)
            intersection() {
                cylinder(h=200, d=D_INNER - T + EPS);
                union() {
                    translate([-50, -D_INNER/2, M_ALIGN - 3])
                        cube(size=[100, 8, 6]);
                    translate([-50, NUT_FLOOR - 10, M_ALIGN - 3])
                        cube(size=[100, 10, 6]);
                }
            }
            // Side holder for locking nuts
            intersection() 
            {
                cylinder(h=200, d=D_INNER - T + EPS);
                union() {
                    translate([6.0, -50, M_COPPER - H_HOLDER_0 - 5.0]) 
                        cube(size=[100, 100, 5.0 + EPS]);
                    mirror([-1, 0, 0]) translate([6.0, -50, M_COPPER - H_HOLDER_0 - 5.0]) 
                        cube(size=[100, 100, 5.0 + EPS]);
                }
            }

            // Lock in the copper
            intersection() 
            {
                union() {
                    translate([-50, -D_INNER/2, M_COPPER]) cube(size=[45, 12.0, H_HOLDER_1]);
                    mirror([-1, 0, 0]) translate([-50, -D_INNER/2, M_COPPER]) cube(size=[45, 12.0, H_HOLDER_1]);
                }
                translate([0, 0, M_COPPER]) 
                    tube(h=H_HOLDER_1, do=D_INNER, di=DO_COPPER + COPPER_OUTSET);
            }
        }
        brassSleeve(addOuter = 1.0);
        translate([0, 0, M_ALIGN]) rotate([90, 0, 0]) cylinder(h=100, d=4.2);

        bolts();

        dotstarCutout();

        hull() {
            translate([0, 50, M_JOINT + 10.0]) rotate([90, 0, 0]) cylinder(h=100, d=12.0);
            translate([0, 50, M_JOINT + 16.0]) rotate([90, 0, 0]) cylinder(h=100, d=12.0);
        }
        for(i=[0:3])
            translate([0, 0, M_JOINT + 18.0 + i*10.0]) capsule(-110, -70, 3);
        
        // Slot for the bottom nut.
        translate([0, 0, M_PORT]) {
            polygonXY(h=24, points=[
                [-NUT_W/2, NUT_FLOOR], [-NUT_W/2, NUT_FLOOR + NUT_Y],
                [-NUT_W/2 + 2, NUT_FLOOR + NUT_Y + 2], [NUT_W/2 - 2, NUT_FLOOR + NUT_Y + 2],
                [NUT_W/2, NUT_FLOOR + NUT_Y], [NUT_W/2, NUT_FLOOR]
            ]);
        }
        // flatten bottom
        flatBottom();
        // flatten top
        translate([-50, D_INNER/2 - 1.5, 0]) cube(size=[100, 10, 200]);

        frontNotch();
    }    

    // coupler to crystal chamber
    difference() {
        union() {
            translate([0, 0, M_COPPER - H_HOLDER_0]) cylinder(d=D_INNER, h=H_HOLDER_0);
            translate([0, 0, M_COPPER]) cylinder(d=DI_COPPER - COPPER_OUTSET, h=H_HOLDER_1);
        }
        brassSleeve(addOuter = 1.0);
        bolts();

        // Cut the dotstar holder:
        DOTSIZE = 5.2;
        STRIPSIZE = 13.0;
        STRIPTHICK = 1.2;
        WIRESIZE = 10.0;
        translate([-DOTSIZE/2, -DOTSIZE/2, M_COPPER - H_HOLDER_0 - EPS])
            cube(size=[DOTSIZE, 100, 10]);            
        translate([-STRIPSIZE/2, -4, M_COPPER - 1.5])
            cube(size=[STRIPSIZE, 100, STRIPTHICK]);
        translate([-WIRESIZE/2, 2.0, M_COPPER - H_HOLDER_0 - EPS])
            cube(size=[WIRESIZE, 100, 8.0]);            

        frontNotch();
        flatBottom();
    }
}

module wireAccess() {
    //D = 4.0;
    //hull() {
    //    translate([(D_INNER - D)/2, 0, M_COPPER]) cylinder(h=100, d=D);
    //    translate([50, 0, M_COPPER]) cylinder(h=100, d=D);
    //}
    translate([D_INNER/2 - 5, -50, M_COPPER + DZ_COPPER])
        cube(size=[50, 100, 100]);
}

if (DRAW_COUPLER) {
    difference() {
        H_IN_COPPER = 2.5;
        echo("coupler", M_PCB_COUPLER - M_COUPLER);

        M_COUPLER = M_COPPER + DZ_COPPER;
        H_COUPLER = M_PCB_COUPLER - M_COUPLER + 2.0;

        union() {
            // end of copper to pcb
            translate([0, 0, M_COUPLER]) 
                cylinder(h=H_COUPLER, d = D_INNER, $fn=60);
            // Inside copper
            translate([0, 0, M_COUPLER - H_IN_COPPER]) 
                cylinder(h=H_COUPLER + H_IN_COPPER, d = DI_COPPER, $fn=60);
        }
        bolts();
        //rotate([0, 0, 45]) wireTube();
        wireAccess();
        rotate([0, 0, 180]) wireAccess();

        // Hold the PCB
        W_PCB = 9.16 + 0.4;
        H_PCB = 16.78 + 0.4;
        translate([-W_PCB/2, -H_PCB/2, M_PCB_COUPLER + 1.0]) 
            cube(size=[W_PCB, H_PCB, 10]);
        // Punch out space under for wires & solder
        PCB_INSET = 2.0;
        translate([-W_PCB/2, -(H_PCB - PCB_INSET)/2, M_PCB_COUPLER - 2.8]) 
            cube(size=[W_PCB, H_PCB - PCB_INSET, 10]);

        // Very specific crystal holder.
        H_TIP = 1.0;
        D_TIP = 4.0;
        DX_TIP = -2.0;
        DY_TIP = 1.5;

        translate([DX_TIP, DY_TIP, M_COUPLER - H_IN_COPPER - EPS])
            cylinder(h=10, d=D_TIP);
    }
}

*color("plum") {
    translate([0, 0, M_PCB_COUPLER]) cylinder(d=D_INNER, h=10.0);
}
